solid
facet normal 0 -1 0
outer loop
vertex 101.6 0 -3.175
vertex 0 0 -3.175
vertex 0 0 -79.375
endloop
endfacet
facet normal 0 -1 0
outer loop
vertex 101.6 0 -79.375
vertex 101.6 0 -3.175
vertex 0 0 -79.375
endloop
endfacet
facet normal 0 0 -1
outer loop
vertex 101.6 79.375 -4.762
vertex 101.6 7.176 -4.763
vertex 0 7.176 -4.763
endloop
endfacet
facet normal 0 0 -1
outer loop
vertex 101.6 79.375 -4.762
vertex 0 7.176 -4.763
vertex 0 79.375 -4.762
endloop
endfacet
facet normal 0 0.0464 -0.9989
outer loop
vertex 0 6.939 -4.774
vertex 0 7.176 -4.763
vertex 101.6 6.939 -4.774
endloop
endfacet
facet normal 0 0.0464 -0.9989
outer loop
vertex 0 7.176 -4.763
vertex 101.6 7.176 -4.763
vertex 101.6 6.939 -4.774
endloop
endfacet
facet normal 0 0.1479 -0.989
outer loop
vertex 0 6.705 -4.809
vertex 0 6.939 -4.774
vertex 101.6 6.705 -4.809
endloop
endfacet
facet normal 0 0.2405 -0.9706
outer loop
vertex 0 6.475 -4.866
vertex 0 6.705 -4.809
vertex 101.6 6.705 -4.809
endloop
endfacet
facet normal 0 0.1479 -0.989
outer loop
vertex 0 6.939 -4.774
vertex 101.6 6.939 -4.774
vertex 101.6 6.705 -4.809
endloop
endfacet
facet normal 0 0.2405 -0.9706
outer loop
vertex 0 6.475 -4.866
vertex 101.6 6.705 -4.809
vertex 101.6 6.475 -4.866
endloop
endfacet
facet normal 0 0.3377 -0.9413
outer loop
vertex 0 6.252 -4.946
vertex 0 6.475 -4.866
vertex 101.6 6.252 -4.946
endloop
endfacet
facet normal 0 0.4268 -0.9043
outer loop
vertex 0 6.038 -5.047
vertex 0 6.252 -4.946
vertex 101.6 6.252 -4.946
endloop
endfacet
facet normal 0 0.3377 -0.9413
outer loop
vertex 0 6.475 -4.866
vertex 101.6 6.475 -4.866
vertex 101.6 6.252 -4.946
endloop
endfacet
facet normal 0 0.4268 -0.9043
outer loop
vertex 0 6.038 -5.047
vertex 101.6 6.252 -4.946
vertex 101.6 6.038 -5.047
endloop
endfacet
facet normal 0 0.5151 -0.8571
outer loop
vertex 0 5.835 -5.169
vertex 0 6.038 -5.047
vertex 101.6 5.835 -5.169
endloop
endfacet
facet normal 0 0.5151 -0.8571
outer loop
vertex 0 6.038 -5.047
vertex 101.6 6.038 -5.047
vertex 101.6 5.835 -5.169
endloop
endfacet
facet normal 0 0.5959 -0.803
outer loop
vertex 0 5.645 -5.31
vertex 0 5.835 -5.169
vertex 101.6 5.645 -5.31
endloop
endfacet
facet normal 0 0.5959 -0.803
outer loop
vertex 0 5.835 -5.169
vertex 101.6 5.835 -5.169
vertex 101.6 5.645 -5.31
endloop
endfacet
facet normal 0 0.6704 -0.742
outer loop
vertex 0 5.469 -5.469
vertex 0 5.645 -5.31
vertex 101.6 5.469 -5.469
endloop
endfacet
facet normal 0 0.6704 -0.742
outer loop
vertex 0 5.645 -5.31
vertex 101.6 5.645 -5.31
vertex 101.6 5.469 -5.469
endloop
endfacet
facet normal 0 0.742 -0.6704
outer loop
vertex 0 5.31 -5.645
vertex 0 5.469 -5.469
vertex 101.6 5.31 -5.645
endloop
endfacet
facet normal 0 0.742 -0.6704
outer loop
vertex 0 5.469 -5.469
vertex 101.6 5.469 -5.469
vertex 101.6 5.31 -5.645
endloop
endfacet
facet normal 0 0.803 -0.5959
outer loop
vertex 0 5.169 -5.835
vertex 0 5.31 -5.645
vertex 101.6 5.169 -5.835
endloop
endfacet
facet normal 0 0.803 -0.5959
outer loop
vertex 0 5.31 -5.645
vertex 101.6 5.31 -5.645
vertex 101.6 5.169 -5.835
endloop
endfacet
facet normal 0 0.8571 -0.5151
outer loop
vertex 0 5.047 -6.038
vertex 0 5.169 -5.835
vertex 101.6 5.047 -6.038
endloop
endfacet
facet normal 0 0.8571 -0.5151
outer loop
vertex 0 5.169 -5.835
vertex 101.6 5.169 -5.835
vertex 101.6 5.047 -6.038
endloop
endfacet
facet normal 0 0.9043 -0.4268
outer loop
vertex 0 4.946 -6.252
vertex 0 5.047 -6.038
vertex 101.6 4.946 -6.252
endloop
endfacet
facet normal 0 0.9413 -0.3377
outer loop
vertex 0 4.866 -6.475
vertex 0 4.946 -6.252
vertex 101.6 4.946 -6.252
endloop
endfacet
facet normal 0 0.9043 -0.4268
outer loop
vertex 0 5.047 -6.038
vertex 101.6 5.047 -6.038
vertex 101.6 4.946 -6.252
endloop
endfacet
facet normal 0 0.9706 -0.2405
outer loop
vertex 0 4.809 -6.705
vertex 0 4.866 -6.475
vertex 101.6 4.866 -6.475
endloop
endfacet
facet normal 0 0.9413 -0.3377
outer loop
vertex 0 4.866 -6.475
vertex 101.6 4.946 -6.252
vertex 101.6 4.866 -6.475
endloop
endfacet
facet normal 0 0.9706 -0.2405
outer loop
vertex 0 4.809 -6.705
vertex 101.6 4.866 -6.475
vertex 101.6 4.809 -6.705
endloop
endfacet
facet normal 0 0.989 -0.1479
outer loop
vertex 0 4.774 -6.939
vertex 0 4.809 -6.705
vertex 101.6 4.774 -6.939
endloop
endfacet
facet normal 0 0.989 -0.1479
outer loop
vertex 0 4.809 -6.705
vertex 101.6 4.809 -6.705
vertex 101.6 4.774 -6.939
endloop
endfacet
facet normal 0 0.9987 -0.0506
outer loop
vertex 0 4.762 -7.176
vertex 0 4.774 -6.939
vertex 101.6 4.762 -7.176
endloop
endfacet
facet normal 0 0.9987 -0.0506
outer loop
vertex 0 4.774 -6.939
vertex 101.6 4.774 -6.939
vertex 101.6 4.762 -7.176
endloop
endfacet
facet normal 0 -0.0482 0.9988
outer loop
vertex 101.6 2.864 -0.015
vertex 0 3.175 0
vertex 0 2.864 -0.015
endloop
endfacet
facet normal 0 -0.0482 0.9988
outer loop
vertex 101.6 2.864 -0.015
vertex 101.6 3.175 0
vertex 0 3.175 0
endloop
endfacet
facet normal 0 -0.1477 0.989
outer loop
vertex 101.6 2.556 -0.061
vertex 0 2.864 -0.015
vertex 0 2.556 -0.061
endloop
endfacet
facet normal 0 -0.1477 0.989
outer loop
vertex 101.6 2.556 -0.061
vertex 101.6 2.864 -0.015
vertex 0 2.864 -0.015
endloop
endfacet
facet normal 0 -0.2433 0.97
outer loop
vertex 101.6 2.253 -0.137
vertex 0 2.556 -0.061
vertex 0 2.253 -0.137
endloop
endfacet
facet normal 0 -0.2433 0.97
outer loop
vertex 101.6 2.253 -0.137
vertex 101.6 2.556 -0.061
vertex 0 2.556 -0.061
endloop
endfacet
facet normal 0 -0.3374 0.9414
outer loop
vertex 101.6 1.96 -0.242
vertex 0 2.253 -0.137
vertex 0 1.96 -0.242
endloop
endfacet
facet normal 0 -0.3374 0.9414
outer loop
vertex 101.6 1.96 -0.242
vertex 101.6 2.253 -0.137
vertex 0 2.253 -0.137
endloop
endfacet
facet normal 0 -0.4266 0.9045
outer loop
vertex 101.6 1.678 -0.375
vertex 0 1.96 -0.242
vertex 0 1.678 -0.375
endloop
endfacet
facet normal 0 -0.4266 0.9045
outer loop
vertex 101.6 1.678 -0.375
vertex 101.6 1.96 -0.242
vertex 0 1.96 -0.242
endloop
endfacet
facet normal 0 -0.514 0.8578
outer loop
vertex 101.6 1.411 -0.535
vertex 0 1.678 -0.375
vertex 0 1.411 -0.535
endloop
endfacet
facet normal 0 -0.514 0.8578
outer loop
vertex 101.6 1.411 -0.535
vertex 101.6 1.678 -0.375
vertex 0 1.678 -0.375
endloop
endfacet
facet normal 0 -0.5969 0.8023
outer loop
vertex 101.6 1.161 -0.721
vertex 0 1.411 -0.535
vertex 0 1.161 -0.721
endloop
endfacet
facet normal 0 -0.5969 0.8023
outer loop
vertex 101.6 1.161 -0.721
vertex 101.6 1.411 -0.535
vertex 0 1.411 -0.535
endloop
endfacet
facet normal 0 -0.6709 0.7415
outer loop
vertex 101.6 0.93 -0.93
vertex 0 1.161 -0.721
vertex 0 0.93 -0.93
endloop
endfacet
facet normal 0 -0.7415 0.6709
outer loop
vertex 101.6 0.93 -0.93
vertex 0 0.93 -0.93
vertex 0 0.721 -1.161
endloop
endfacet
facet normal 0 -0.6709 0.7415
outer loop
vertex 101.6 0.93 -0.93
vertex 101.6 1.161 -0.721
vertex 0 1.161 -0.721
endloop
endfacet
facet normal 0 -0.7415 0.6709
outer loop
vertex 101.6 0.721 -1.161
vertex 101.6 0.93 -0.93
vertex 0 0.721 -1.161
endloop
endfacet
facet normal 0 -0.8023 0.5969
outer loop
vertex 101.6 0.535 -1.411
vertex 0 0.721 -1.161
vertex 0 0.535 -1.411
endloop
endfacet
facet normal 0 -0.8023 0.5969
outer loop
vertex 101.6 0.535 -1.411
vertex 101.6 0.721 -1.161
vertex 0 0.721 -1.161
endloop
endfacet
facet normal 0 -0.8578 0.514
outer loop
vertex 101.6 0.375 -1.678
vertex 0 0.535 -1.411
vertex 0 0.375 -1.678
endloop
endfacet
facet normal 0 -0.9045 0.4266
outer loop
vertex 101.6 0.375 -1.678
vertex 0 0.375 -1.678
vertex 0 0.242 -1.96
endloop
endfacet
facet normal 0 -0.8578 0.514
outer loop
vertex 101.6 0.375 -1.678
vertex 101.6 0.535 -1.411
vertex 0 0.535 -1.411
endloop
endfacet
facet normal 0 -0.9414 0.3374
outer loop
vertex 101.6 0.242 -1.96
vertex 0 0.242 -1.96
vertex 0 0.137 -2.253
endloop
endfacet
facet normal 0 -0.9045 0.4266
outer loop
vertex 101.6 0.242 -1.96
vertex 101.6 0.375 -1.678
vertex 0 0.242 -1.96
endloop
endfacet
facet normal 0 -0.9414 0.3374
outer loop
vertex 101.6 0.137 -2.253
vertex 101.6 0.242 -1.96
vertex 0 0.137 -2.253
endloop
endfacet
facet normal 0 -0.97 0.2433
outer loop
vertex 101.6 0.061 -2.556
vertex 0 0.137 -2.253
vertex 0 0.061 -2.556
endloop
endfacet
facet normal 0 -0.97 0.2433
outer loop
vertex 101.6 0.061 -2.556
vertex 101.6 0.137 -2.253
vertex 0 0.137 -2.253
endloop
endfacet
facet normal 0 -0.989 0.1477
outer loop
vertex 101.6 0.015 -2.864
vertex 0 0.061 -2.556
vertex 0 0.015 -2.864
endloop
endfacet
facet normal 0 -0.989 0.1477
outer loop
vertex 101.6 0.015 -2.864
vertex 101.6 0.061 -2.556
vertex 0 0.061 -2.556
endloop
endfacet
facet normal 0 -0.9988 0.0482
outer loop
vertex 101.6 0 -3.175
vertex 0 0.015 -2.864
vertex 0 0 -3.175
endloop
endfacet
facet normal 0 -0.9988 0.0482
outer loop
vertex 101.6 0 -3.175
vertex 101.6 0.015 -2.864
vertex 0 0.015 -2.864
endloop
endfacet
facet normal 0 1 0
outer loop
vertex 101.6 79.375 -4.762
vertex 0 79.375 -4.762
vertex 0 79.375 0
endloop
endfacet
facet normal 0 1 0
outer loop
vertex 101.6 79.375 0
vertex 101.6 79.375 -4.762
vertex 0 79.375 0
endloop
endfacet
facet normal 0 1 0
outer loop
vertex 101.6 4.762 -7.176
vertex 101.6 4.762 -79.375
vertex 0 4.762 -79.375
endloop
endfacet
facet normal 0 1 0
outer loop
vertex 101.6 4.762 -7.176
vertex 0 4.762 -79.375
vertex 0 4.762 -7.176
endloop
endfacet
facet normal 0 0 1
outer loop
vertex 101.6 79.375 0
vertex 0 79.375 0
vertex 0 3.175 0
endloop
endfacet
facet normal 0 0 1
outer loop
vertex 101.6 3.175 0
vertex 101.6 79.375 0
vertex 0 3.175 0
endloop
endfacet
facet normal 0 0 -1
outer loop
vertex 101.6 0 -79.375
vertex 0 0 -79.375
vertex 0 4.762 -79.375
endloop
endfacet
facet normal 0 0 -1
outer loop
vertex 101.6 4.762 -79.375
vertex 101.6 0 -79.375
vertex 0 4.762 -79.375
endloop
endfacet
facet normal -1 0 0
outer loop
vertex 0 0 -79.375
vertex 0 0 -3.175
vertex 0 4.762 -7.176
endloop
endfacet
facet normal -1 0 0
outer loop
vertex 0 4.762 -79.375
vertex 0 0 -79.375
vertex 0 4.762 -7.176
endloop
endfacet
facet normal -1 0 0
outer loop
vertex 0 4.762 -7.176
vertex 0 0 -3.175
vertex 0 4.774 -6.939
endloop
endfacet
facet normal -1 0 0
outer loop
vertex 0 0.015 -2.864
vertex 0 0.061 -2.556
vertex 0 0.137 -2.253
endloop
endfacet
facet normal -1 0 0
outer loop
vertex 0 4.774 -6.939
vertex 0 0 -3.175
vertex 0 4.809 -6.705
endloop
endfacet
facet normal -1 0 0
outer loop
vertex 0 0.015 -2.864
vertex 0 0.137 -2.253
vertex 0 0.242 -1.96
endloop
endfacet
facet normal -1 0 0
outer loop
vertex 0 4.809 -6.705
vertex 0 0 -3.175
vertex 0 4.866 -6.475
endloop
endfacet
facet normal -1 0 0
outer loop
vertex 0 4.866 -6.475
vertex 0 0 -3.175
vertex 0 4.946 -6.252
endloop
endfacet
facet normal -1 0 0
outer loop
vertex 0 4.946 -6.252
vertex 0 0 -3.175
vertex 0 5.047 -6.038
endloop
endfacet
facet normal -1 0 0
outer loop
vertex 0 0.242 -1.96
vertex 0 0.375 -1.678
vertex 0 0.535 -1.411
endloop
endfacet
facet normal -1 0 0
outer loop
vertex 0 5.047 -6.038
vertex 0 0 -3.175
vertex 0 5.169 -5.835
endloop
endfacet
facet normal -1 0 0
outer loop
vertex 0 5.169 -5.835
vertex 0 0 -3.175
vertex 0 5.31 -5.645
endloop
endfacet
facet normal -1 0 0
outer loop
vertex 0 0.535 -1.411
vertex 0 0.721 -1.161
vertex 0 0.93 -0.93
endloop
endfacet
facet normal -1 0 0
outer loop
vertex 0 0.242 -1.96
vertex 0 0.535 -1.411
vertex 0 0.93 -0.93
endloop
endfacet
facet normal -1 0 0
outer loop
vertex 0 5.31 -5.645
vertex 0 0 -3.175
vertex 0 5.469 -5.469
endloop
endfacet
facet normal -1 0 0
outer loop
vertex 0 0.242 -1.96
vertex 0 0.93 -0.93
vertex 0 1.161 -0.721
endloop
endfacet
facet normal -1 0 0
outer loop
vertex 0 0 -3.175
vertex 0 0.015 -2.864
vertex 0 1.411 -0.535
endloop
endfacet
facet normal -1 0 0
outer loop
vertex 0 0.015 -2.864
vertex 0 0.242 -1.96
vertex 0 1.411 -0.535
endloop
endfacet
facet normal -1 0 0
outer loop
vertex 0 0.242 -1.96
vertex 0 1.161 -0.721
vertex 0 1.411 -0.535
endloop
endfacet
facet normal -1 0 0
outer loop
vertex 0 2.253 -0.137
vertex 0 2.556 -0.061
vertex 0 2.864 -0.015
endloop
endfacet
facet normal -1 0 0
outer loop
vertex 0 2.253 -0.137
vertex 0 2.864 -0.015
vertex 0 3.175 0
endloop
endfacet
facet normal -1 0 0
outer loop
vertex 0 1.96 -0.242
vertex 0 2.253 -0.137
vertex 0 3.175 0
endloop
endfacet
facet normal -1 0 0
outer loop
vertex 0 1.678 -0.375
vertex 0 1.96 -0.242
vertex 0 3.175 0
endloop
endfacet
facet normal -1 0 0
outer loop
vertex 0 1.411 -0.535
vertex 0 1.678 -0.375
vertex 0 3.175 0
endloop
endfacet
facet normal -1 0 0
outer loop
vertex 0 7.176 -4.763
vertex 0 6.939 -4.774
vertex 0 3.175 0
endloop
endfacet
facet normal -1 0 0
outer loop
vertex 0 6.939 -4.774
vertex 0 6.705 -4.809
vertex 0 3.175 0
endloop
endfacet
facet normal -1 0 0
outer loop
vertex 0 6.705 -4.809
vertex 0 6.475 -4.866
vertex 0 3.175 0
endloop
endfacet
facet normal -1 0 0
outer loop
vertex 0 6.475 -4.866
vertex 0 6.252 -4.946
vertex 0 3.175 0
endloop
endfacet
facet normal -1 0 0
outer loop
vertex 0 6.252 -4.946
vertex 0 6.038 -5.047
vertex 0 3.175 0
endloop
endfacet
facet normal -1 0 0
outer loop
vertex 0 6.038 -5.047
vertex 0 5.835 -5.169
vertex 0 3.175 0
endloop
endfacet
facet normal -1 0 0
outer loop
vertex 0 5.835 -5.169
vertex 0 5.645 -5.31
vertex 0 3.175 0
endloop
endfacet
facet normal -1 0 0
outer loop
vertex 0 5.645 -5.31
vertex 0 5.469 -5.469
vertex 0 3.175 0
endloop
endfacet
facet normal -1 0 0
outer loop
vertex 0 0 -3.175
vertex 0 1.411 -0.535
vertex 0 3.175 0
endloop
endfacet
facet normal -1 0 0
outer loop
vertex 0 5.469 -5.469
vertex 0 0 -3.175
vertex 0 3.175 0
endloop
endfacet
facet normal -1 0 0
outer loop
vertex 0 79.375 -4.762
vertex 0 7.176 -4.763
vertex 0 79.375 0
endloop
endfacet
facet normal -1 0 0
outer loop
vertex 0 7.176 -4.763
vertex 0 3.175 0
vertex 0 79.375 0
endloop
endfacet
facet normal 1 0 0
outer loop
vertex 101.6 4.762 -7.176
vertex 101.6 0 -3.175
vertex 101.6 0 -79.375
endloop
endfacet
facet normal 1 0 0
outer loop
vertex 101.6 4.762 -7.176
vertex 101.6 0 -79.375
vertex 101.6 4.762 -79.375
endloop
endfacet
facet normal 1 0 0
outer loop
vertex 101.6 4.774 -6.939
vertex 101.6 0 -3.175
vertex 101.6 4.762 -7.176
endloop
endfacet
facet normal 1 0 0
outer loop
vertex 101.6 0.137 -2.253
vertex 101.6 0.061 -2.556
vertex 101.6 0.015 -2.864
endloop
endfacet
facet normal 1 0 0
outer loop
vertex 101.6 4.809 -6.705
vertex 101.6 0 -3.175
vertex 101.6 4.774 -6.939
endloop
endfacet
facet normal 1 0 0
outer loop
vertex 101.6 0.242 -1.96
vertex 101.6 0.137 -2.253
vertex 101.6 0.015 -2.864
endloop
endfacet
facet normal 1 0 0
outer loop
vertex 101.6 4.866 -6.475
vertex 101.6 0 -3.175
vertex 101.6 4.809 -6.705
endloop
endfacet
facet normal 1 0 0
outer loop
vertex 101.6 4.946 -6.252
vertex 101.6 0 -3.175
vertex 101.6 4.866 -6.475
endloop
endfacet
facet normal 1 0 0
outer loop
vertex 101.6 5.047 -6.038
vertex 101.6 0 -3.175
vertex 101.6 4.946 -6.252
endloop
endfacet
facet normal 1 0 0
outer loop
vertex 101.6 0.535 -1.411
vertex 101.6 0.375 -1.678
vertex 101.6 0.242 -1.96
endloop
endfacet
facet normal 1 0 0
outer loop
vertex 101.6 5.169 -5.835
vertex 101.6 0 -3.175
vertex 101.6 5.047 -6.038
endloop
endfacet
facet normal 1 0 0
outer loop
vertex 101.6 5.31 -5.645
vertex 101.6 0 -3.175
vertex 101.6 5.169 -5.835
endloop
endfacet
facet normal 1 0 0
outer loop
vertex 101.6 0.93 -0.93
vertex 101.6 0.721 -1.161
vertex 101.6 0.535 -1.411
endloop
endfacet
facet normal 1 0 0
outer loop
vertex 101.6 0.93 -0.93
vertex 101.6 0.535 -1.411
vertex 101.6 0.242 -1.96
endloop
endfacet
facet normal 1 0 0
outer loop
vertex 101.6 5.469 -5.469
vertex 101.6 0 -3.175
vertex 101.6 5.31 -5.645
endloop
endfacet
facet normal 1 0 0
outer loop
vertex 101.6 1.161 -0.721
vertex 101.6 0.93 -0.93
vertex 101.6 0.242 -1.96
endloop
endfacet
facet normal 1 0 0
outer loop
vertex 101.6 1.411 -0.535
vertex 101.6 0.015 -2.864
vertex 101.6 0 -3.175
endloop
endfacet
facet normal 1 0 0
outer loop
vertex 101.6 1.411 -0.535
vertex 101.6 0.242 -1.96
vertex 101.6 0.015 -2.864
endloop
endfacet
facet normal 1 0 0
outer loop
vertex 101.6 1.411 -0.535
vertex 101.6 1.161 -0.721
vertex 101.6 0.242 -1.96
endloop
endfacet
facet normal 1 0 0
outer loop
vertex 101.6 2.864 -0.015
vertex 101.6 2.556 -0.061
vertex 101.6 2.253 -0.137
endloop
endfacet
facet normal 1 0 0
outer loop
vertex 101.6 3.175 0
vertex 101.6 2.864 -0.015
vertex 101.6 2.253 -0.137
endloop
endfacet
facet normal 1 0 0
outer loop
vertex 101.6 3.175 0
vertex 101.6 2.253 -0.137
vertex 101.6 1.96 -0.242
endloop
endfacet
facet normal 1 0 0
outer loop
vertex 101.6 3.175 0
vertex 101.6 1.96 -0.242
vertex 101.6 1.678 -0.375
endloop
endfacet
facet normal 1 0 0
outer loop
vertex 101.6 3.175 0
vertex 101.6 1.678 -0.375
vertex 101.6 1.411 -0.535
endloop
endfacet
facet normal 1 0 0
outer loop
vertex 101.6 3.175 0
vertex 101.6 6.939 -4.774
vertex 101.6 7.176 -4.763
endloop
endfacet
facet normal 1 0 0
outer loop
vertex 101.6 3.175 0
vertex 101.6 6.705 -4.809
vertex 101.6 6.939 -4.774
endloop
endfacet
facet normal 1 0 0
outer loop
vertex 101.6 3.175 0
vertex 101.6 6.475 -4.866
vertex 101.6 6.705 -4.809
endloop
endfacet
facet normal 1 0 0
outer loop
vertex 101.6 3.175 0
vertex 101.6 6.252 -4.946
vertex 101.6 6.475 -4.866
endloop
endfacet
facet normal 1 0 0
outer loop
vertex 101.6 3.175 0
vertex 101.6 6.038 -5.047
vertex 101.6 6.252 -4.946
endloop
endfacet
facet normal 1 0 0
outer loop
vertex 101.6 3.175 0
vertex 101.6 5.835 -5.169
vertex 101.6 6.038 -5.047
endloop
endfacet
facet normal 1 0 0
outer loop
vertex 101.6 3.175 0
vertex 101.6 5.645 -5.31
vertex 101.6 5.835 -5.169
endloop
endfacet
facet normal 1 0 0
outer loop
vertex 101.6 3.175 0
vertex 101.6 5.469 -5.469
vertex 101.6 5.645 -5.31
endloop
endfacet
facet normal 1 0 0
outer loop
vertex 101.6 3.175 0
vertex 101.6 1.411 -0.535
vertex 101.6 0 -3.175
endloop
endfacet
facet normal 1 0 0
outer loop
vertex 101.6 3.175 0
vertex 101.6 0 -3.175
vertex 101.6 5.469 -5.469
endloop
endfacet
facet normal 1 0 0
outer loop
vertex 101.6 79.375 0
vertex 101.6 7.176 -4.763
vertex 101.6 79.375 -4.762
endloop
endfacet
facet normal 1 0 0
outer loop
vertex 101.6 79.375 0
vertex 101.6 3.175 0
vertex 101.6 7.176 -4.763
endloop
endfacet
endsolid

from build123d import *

# Parameters (mm, degrees)
F1_DEPTH = 101.6
F2_R     = 3.175
F3_R     = 2.413


with BuildPart() as f1:
    # F0 (on Right) → F1 (new body)
    with BuildSketch(Plane.YZ):
        Polygon((79.375, 0), (0, 0), (0, -79.375), (4.7625, -79.375), (4.7625, -4.7625), (79.375, -4.7625), align=None)
    extrude(amount=F1_DEPTH)

    # F2
    f2_edges = [f1.edges().sort_by_distance(p)[0] for p in [
        (50.8, 0, 0),
    ]]
    fillet(f2_edges, radius=F2_R)

    # F3
    f3_edges = [f1.edges().sort_by_distance(p)[0] for p in [
        (50.8, 4.7625, -4.7625),
    ]]
    fillet(f3_edges, radius=F3_R)


solid = f1.part
